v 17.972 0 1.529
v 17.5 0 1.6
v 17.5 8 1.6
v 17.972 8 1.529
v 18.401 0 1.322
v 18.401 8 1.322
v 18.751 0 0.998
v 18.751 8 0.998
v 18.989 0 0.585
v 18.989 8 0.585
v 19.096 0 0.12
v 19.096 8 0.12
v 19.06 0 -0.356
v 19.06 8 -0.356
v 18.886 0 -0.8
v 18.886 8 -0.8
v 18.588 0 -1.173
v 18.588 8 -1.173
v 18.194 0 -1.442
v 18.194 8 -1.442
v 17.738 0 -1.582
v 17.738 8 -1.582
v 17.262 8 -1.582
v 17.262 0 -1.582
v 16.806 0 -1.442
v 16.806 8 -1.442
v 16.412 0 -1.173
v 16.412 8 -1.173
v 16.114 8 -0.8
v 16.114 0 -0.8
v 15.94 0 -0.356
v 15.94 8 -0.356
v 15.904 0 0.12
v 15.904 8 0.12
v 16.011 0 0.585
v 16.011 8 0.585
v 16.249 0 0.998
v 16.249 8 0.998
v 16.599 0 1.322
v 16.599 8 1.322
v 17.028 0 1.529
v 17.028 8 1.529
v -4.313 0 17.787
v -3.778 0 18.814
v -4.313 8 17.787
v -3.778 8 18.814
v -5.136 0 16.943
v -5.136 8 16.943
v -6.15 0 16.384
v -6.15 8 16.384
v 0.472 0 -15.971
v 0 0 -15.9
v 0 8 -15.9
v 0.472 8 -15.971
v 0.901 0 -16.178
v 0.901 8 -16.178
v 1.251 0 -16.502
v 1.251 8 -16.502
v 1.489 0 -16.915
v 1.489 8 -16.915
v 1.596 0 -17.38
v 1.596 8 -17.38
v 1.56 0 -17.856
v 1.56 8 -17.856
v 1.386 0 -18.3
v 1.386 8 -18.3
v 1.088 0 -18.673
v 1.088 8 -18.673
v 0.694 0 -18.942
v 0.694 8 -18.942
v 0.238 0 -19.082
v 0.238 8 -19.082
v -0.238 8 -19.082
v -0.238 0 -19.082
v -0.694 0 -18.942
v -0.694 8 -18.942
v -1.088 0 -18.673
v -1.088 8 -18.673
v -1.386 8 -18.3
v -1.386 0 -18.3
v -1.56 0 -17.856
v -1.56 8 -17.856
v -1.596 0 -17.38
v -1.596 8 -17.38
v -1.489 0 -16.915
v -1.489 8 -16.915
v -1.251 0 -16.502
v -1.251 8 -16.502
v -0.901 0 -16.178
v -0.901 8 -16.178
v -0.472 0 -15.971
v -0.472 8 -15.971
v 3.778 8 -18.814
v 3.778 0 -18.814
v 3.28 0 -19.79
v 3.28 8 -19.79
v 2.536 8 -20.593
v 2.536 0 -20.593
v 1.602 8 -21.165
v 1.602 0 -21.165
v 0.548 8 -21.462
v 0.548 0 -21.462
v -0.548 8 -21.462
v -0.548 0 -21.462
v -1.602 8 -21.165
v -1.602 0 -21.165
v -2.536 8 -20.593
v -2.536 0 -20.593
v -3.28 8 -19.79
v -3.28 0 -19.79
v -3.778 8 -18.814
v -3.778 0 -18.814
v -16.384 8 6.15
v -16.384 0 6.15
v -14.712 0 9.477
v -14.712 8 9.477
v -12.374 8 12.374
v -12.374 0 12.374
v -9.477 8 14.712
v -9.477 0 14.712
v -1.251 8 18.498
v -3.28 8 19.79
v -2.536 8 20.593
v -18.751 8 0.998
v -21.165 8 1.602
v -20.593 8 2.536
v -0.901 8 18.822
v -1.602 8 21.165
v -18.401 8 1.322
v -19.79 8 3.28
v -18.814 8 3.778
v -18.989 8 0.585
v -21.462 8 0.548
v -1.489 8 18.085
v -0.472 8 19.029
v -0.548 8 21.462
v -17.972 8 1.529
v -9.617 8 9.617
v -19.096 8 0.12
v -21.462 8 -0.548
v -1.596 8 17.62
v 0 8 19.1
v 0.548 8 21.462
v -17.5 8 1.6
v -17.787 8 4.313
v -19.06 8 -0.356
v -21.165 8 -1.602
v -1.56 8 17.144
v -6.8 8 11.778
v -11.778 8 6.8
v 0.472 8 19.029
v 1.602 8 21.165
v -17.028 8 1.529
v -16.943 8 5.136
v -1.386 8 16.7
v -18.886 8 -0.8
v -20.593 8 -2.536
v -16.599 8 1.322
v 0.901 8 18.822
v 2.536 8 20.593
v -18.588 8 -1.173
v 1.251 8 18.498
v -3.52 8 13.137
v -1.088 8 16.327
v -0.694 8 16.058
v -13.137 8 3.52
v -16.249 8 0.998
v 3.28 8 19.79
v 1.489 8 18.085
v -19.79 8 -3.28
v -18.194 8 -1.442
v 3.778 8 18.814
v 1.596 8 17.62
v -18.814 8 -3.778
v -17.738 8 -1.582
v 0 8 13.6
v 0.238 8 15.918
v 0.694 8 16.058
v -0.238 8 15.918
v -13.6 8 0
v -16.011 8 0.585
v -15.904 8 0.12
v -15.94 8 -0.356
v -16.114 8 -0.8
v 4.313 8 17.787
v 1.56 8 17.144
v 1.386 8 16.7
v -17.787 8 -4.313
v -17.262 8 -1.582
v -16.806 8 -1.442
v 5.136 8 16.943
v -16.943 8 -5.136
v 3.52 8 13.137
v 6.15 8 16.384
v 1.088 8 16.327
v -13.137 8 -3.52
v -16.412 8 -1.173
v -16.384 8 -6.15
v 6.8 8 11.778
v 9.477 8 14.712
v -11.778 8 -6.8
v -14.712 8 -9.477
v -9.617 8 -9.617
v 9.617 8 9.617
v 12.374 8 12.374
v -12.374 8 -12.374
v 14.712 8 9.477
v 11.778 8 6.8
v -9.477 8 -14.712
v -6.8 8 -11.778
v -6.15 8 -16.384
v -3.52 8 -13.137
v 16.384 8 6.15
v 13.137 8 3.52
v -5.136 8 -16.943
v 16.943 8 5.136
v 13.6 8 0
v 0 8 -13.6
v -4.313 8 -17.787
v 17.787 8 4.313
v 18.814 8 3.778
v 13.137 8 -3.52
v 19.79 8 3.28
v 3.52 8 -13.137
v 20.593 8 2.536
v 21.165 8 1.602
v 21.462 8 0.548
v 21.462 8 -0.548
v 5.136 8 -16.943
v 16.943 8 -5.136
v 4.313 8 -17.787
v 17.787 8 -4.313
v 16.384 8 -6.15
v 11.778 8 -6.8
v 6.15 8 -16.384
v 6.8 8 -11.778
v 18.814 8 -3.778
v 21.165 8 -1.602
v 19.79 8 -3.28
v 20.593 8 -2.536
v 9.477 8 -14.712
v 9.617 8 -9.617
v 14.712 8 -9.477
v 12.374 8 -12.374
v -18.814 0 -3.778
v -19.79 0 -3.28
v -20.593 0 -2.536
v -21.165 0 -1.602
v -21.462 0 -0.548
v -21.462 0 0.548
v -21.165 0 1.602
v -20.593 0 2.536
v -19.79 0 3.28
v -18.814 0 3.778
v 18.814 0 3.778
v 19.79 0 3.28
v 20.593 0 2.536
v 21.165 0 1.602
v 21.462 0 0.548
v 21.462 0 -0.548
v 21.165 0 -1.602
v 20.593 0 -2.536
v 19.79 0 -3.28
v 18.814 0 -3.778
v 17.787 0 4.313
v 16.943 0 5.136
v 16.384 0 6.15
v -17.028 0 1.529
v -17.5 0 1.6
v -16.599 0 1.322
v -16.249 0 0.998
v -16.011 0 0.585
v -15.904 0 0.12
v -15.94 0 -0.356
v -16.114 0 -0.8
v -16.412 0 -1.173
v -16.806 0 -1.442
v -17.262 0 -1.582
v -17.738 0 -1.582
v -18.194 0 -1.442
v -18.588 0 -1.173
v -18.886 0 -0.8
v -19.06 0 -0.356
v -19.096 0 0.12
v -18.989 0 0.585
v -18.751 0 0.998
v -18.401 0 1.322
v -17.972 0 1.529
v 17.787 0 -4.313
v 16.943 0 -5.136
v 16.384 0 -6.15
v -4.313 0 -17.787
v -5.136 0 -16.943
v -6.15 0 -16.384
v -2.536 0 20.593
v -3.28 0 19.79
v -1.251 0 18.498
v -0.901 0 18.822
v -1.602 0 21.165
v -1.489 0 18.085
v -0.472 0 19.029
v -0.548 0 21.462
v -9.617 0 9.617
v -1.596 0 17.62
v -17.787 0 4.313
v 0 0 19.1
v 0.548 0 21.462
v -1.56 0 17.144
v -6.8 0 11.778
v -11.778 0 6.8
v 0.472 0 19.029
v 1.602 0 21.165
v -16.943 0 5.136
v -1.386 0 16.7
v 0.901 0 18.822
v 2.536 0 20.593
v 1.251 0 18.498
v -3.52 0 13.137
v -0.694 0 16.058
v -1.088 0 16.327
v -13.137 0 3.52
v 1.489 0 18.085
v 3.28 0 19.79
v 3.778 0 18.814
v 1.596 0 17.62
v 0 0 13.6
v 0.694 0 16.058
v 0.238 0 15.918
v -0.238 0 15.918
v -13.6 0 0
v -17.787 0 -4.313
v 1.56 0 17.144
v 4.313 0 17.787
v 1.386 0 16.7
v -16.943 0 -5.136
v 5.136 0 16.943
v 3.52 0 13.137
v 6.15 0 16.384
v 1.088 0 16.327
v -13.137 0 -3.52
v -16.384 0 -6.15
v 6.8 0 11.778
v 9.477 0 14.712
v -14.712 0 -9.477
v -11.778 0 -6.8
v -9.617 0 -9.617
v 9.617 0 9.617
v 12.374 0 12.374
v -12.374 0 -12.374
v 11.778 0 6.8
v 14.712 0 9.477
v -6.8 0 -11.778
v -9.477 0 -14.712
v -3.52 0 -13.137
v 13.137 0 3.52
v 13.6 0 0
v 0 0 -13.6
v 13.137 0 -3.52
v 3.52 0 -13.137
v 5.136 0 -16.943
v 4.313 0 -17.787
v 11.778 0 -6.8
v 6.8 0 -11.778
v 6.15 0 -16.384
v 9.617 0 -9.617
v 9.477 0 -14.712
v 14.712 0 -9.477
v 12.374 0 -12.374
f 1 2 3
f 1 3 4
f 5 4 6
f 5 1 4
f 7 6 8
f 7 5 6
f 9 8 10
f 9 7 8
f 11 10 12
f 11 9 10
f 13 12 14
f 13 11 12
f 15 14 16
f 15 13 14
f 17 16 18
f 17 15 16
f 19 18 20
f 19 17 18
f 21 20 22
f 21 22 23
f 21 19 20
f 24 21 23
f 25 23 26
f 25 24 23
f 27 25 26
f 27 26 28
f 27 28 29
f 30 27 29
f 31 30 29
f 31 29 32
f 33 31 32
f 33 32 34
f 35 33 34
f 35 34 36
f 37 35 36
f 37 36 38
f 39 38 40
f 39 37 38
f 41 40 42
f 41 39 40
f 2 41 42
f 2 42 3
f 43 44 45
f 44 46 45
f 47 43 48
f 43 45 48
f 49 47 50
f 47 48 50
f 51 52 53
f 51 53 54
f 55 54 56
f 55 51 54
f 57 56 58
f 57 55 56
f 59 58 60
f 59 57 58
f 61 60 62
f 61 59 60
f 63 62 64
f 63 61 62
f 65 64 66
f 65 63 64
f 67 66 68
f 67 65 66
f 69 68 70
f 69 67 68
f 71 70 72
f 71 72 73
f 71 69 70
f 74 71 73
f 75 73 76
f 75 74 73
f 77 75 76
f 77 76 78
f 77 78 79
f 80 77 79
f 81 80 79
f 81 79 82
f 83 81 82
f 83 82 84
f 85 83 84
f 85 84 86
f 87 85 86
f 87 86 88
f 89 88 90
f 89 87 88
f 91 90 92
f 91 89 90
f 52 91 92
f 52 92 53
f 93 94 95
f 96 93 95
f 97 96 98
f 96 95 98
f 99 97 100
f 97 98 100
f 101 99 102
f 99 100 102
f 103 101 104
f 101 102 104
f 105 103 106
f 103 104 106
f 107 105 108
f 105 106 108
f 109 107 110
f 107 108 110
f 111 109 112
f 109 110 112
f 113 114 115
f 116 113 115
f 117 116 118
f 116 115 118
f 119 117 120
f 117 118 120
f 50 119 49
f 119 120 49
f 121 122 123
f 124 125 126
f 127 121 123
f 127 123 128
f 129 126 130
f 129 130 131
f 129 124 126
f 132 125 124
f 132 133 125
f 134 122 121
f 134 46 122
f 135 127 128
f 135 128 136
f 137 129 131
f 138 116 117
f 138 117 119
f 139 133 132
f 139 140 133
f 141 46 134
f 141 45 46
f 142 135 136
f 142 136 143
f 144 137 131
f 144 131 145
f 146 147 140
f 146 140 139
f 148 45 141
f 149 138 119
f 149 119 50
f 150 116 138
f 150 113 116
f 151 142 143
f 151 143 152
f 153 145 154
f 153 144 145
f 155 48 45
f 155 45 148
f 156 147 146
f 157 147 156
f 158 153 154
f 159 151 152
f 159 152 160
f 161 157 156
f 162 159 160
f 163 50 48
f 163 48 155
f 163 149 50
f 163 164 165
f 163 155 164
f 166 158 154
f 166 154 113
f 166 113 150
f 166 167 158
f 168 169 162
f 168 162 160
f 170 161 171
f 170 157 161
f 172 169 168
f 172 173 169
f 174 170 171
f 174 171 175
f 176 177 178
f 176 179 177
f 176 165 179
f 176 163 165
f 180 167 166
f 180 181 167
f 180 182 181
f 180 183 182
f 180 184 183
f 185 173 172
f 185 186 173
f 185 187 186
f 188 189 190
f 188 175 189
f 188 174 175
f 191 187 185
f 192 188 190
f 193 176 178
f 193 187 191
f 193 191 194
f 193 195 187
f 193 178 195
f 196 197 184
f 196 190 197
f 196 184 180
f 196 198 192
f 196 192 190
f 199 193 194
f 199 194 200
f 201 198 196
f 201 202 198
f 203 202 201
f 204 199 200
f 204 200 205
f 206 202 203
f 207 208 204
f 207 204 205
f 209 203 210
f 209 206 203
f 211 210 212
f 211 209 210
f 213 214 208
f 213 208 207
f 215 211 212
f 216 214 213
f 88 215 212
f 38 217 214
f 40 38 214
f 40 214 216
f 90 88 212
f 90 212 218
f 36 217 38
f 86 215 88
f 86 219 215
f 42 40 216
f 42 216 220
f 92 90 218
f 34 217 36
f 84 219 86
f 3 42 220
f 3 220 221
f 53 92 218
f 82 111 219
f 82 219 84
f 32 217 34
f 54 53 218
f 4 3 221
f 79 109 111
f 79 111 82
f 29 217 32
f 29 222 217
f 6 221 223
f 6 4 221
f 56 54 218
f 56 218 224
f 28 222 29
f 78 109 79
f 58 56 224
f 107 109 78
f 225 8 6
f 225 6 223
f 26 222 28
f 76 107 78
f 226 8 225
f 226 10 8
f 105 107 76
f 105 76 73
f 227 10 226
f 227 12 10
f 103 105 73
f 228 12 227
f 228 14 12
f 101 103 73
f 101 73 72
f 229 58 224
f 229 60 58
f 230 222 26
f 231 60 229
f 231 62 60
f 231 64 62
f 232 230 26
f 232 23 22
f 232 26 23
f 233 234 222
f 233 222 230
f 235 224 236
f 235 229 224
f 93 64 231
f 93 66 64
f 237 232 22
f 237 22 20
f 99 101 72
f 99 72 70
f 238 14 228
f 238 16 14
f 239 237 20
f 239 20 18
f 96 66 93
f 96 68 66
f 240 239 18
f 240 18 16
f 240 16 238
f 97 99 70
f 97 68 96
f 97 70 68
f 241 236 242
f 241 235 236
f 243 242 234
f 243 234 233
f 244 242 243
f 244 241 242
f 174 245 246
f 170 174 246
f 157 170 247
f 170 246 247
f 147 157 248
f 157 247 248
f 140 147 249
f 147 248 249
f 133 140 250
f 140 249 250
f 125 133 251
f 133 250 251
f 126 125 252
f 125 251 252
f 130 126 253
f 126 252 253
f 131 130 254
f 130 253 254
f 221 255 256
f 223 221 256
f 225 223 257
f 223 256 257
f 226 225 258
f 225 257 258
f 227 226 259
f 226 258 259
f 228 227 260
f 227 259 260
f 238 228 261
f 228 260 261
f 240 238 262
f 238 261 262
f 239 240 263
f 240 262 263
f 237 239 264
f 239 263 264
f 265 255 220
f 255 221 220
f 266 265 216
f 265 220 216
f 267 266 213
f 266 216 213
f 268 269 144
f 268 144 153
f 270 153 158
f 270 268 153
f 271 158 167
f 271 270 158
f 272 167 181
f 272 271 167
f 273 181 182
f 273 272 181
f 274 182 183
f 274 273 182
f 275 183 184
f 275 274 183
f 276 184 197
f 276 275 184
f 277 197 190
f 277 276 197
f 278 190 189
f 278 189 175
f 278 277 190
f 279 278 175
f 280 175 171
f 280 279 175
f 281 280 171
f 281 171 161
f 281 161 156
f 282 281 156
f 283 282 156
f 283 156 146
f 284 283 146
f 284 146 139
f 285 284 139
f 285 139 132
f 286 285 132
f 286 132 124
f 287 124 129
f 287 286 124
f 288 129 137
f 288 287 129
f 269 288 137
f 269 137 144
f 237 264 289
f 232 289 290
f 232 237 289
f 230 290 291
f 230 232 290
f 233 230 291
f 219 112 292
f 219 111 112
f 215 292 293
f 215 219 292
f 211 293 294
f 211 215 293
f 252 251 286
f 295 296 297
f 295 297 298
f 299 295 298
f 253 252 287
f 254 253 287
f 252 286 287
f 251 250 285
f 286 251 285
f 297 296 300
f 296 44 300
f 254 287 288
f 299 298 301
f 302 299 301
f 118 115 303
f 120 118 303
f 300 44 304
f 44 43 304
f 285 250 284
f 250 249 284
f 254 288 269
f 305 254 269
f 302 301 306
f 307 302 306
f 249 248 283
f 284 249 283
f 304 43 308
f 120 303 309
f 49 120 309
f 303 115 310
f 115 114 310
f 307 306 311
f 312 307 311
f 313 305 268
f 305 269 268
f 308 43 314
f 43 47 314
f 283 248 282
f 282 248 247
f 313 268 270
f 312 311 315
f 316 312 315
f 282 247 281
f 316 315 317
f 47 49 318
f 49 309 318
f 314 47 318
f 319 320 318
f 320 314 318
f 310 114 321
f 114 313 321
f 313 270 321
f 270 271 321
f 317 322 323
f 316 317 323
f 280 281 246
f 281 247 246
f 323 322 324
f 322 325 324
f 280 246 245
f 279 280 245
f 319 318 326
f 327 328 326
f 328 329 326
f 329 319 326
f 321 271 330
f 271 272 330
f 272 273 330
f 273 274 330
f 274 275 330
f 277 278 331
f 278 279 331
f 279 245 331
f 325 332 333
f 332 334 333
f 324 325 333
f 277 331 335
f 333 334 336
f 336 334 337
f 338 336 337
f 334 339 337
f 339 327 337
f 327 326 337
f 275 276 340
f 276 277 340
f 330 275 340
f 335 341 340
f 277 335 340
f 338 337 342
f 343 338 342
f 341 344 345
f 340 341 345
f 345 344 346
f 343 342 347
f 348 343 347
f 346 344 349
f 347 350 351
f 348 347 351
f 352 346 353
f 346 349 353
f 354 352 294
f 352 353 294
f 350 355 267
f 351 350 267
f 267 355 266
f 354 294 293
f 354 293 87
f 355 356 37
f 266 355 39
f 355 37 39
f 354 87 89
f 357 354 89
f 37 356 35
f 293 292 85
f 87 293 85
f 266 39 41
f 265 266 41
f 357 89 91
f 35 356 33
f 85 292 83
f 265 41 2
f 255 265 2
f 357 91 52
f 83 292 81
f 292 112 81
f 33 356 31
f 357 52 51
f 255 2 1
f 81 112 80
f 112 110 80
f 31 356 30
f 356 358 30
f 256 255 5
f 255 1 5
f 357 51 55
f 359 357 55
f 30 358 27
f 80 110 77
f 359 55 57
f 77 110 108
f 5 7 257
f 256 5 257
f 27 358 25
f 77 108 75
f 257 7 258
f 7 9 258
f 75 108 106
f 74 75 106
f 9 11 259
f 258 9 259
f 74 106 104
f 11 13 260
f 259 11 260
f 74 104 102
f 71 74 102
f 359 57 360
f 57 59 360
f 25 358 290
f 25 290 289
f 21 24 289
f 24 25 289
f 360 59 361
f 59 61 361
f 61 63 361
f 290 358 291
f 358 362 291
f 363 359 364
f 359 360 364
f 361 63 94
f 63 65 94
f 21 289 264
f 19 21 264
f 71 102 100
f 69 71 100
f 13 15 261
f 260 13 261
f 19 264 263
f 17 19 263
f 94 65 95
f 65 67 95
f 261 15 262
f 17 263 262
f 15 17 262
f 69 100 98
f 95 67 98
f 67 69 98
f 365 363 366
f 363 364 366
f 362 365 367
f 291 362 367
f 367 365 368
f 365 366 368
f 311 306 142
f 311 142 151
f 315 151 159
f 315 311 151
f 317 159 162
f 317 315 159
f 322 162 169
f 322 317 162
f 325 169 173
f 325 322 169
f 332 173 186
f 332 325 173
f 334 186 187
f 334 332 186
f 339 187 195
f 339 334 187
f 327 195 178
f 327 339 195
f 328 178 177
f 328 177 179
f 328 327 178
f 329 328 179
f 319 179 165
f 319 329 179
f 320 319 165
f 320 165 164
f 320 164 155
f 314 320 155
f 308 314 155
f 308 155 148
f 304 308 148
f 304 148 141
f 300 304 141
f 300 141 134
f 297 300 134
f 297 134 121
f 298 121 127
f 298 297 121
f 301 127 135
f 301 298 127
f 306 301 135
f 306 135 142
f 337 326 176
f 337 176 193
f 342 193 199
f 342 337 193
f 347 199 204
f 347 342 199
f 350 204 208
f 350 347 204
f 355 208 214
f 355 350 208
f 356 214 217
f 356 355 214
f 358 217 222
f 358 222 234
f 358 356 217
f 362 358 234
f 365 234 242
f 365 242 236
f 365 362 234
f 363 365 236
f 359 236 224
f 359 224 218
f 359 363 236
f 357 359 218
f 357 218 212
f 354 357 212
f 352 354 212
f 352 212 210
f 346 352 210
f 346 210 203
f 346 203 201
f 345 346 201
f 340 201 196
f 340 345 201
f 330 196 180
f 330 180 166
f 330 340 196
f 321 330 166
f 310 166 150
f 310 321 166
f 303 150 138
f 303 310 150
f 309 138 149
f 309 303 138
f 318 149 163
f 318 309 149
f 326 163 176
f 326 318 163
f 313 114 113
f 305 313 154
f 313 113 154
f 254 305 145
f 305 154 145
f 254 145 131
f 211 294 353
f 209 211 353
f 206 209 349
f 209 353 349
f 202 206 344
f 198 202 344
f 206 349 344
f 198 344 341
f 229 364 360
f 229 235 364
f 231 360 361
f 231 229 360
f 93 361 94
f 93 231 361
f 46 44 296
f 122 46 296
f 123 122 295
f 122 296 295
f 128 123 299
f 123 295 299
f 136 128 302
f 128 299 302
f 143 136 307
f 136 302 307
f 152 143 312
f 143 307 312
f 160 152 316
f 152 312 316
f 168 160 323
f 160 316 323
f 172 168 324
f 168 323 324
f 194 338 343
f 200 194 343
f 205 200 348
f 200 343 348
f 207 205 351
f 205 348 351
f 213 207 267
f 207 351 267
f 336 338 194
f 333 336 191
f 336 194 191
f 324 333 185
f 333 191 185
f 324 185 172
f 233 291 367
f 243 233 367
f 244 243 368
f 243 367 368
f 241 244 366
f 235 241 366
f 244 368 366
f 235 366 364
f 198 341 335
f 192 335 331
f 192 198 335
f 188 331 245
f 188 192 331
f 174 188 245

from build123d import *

# Parameters (mm, degrees)
SKETCH_1_R      = 1.6
SKETCH_1_R_2    = 13.6
EXTRUDE_1_DEPTH = 8
FILLET_1_R      = 4


with BuildPart() as part:
    # ｽｹｯﾁ1 → ﾎﾞｽ - 押し出し1 (new body)
    with BuildSketch(Plane(origin=(0, 0, 0), x_dir=(1, 0, 0), z_dir=(0, 1, 0))):
        with BuildLine():
            ThreePointArc((17.042857143, 3.973791692), (12.374368671, 12.374368671), (3.973791692, 17.042857143))
            ThreePointArc((3.973791692, 17.042857143), (0, 21.5), (-3.973791692, 17.042857143))
            ThreePointArc((-3.973791692, 17.042857143), (-12.374368671, 12.374368671), (-17.042857143, 3.973791692))
            ThreePointArc((-17.042857143, 3.973791692), (-21.5, 0), (-17.042857143, -3.973791692))
            ThreePointArc((-17.042857143, -3.973791692), (-12.374368671, -12.374368671), (-3.973791692, -17.042857143))
            ThreePointArc((-3.973791692, -17.042857143), (0, -21.5), (3.973791692, -17.042857143))
            ThreePointArc((3.973791692, -17.042857143), (12.374368671, -12.374368671), (17.042857143, -3.973791692))
            ThreePointArc((17.042857143, -3.973791692), (21.5, 0), (17.042857143, 3.973791692))
        make_face()
        with Locations((17.5, 0)):
            Circle(SKETCH_1_R, mode=Mode.SUBTRACT)
        Circle(SKETCH_1_R_2, mode=Mode.SUBTRACT)
        with Locations((0, -17.5)):
            Circle(SKETCH_1_R, mode=Mode.SUBTRACT)
        with Locations((0, 17.5)):
            Circle(SKETCH_1_R, mode=Mode.SUBTRACT)
        with Locations((-17.5, 0)):
            Circle(SKETCH_1_R, mode=Mode.SUBTRACT)
    extrude(amount=EXTRUDE_1_DEPTH)

    # ﾌｨﾚｯﾄ1
    fillet_1_edges = [part.edges().sort_by_distance(p)[0] for p in [
        (-17.042857143, 4, 3.973791692),
        (-3.973791692, 4, 17.042857143),
        (3.973791692, 4, 17.042857143),
        (17.042857143, 4, 3.973791692),
        (17.042857143, 4, -3.973791692),
        (3.973791692, 4, -17.042857143),
        (-17.042857143, 4, -3.973791692),
        (-3.973791692, 4, -17.042857143),
    ]]
    fillet(fillet_1_edges, radius=FILLET_1_R)


solid = part.part
